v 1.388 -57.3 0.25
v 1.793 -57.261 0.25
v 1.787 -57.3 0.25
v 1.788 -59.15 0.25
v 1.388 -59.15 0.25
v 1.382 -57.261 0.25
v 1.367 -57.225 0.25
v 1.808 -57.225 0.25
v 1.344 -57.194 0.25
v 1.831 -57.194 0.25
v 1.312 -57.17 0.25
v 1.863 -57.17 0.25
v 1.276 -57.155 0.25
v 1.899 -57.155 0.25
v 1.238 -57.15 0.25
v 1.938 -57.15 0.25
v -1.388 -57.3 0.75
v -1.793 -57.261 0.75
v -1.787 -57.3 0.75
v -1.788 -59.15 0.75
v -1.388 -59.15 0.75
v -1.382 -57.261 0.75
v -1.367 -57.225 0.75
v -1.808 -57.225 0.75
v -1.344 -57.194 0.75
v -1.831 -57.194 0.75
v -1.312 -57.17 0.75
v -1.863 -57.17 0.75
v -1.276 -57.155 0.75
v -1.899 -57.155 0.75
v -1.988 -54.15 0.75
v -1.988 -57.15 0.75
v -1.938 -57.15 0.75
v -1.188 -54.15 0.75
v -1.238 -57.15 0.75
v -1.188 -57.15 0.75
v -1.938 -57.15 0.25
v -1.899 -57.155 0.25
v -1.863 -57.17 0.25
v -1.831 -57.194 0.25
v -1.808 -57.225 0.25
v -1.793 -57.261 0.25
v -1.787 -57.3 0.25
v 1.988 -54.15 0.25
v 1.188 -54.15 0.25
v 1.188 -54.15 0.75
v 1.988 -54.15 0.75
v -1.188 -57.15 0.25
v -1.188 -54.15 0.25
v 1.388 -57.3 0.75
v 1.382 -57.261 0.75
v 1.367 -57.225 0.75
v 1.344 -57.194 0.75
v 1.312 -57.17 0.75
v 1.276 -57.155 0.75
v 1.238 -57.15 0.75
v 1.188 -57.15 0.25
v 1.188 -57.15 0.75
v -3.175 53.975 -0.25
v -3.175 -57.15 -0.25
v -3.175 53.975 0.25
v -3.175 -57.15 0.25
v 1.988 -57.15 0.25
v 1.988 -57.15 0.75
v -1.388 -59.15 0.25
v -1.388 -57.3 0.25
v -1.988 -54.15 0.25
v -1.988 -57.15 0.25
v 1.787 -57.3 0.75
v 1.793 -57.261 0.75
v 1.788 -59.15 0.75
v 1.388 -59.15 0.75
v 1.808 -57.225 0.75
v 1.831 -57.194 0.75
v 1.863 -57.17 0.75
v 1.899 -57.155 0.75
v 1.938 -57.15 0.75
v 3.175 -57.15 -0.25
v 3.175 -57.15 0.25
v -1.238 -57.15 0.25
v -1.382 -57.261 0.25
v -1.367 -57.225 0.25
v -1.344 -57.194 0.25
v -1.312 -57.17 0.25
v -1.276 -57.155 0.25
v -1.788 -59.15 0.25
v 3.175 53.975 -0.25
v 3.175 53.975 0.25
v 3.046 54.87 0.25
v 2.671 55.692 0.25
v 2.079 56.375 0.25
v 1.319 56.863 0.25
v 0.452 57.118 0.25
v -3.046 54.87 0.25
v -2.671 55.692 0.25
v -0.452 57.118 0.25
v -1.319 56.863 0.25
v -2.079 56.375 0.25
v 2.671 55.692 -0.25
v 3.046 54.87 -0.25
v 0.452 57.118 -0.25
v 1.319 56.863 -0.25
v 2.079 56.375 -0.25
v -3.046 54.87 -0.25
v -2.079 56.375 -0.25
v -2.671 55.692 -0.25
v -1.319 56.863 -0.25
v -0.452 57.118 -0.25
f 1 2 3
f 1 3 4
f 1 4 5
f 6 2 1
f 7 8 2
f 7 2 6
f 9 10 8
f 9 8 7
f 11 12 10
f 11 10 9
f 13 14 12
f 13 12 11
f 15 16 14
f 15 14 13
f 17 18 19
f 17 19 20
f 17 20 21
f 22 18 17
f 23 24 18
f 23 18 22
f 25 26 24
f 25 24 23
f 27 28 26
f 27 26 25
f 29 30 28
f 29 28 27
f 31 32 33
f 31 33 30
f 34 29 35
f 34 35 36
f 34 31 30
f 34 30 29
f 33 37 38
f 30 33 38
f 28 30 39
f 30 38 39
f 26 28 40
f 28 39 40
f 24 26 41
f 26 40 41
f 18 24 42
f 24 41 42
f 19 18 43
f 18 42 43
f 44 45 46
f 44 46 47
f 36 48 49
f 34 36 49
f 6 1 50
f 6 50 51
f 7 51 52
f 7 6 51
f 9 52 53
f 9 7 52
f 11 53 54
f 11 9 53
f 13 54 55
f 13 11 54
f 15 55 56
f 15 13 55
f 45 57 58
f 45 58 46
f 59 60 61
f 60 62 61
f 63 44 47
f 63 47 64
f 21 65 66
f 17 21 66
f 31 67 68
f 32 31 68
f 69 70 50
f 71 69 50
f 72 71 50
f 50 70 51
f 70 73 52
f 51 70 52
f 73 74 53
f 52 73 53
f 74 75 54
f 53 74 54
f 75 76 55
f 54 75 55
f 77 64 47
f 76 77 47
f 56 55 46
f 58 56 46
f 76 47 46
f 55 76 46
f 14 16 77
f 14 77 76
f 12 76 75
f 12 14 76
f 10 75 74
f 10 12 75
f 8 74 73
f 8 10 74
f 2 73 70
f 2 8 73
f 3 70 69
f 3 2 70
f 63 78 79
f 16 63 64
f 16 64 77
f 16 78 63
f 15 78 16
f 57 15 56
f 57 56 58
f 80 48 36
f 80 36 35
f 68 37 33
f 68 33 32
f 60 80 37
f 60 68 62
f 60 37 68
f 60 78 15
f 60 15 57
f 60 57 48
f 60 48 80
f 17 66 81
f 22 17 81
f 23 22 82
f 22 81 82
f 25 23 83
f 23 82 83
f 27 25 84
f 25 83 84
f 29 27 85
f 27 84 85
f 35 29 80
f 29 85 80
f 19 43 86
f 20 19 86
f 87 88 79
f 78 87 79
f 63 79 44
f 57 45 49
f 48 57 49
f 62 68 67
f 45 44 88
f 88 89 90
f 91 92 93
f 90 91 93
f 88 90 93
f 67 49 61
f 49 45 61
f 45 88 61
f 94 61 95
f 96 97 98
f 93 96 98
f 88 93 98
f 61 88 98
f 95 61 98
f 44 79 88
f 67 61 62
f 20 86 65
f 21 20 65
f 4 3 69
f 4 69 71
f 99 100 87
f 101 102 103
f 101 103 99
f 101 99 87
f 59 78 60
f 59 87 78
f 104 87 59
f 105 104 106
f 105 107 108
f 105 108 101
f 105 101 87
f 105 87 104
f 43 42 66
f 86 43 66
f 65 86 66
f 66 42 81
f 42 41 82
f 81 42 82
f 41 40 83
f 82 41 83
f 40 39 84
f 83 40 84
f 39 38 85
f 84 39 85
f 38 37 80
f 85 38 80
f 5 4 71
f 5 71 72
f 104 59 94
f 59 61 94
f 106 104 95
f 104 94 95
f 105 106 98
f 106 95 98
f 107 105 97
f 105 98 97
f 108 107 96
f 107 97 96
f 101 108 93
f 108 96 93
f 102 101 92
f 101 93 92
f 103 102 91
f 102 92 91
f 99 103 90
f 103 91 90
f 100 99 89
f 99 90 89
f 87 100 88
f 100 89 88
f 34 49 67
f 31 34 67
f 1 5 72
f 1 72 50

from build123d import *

# Parameters (mm, degrees)
RESSALTO_EXTRUS_O1_DEPTH = 0.25
RESSALTO_EXTRUS_O2_DEPTH = 0.5


with BuildPart() as part:
    # Esboço3 → Ressalto-extrusão1 (new, symmetric)
    with BuildSketch(Plane.XY):
        with BuildLine():
            Line((3.175, -57.15), (-3.175, -57.15))
            Line((-3.175, -57.15), (-3.175, 53.975))
            ThreePointArc((-3.175, 53.975), (0, 57.15), (3.175, 53.975))
            Line((3.175, 53.975), (3.175, -57.15))
        make_face()
    extrude(amount=RESSALTO_EXTRUS_O1_DEPTH, both=True)

    # Esboço4 → Ressalto-extrusão2 (add)
    with BuildSketch(Plane.XY.offset(0.25)):
        Polygon((-1.1875, -54.15), (-1.9875, -54.15), (-1.9875, -57.15), (-1.9375, -57.15), (-1.2375, -57.15), (-1.1875, -57.15), align=None)
        with BuildLine():
            Line((-1.2375, -57.15), (-1.9375, -57.15))
            ThreePointArc((-1.9375, -57.15), (-1.831433983, -57.193933983), (-1.7875, -57.3))
            Line((-1.7875, -57.3), (-1.7875, -59.15))
            Line((-1.7875, -59.15), (-1.3875, -59.15))
            Line((-1.3875, -59.15), (-1.3875, -57.3))
            ThreePointArc((-1.3875, -57.3), (-1.343566017, -57.193933983), (-1.2375, -57.15))
        make_face()
    ressalto_extrus_o2 = extrude(amount=RESSALTO_EXTRUS_O2_DEPTH)

    # Espelhar2: Ressalto-extrusão2 across plane
    add(ressalto_extrus_o2.mirror(Plane(origin=(0, 0, 0), x_dir=(0, 0, 1), z_dir=(1, 0, 0))))


solid = part.part
